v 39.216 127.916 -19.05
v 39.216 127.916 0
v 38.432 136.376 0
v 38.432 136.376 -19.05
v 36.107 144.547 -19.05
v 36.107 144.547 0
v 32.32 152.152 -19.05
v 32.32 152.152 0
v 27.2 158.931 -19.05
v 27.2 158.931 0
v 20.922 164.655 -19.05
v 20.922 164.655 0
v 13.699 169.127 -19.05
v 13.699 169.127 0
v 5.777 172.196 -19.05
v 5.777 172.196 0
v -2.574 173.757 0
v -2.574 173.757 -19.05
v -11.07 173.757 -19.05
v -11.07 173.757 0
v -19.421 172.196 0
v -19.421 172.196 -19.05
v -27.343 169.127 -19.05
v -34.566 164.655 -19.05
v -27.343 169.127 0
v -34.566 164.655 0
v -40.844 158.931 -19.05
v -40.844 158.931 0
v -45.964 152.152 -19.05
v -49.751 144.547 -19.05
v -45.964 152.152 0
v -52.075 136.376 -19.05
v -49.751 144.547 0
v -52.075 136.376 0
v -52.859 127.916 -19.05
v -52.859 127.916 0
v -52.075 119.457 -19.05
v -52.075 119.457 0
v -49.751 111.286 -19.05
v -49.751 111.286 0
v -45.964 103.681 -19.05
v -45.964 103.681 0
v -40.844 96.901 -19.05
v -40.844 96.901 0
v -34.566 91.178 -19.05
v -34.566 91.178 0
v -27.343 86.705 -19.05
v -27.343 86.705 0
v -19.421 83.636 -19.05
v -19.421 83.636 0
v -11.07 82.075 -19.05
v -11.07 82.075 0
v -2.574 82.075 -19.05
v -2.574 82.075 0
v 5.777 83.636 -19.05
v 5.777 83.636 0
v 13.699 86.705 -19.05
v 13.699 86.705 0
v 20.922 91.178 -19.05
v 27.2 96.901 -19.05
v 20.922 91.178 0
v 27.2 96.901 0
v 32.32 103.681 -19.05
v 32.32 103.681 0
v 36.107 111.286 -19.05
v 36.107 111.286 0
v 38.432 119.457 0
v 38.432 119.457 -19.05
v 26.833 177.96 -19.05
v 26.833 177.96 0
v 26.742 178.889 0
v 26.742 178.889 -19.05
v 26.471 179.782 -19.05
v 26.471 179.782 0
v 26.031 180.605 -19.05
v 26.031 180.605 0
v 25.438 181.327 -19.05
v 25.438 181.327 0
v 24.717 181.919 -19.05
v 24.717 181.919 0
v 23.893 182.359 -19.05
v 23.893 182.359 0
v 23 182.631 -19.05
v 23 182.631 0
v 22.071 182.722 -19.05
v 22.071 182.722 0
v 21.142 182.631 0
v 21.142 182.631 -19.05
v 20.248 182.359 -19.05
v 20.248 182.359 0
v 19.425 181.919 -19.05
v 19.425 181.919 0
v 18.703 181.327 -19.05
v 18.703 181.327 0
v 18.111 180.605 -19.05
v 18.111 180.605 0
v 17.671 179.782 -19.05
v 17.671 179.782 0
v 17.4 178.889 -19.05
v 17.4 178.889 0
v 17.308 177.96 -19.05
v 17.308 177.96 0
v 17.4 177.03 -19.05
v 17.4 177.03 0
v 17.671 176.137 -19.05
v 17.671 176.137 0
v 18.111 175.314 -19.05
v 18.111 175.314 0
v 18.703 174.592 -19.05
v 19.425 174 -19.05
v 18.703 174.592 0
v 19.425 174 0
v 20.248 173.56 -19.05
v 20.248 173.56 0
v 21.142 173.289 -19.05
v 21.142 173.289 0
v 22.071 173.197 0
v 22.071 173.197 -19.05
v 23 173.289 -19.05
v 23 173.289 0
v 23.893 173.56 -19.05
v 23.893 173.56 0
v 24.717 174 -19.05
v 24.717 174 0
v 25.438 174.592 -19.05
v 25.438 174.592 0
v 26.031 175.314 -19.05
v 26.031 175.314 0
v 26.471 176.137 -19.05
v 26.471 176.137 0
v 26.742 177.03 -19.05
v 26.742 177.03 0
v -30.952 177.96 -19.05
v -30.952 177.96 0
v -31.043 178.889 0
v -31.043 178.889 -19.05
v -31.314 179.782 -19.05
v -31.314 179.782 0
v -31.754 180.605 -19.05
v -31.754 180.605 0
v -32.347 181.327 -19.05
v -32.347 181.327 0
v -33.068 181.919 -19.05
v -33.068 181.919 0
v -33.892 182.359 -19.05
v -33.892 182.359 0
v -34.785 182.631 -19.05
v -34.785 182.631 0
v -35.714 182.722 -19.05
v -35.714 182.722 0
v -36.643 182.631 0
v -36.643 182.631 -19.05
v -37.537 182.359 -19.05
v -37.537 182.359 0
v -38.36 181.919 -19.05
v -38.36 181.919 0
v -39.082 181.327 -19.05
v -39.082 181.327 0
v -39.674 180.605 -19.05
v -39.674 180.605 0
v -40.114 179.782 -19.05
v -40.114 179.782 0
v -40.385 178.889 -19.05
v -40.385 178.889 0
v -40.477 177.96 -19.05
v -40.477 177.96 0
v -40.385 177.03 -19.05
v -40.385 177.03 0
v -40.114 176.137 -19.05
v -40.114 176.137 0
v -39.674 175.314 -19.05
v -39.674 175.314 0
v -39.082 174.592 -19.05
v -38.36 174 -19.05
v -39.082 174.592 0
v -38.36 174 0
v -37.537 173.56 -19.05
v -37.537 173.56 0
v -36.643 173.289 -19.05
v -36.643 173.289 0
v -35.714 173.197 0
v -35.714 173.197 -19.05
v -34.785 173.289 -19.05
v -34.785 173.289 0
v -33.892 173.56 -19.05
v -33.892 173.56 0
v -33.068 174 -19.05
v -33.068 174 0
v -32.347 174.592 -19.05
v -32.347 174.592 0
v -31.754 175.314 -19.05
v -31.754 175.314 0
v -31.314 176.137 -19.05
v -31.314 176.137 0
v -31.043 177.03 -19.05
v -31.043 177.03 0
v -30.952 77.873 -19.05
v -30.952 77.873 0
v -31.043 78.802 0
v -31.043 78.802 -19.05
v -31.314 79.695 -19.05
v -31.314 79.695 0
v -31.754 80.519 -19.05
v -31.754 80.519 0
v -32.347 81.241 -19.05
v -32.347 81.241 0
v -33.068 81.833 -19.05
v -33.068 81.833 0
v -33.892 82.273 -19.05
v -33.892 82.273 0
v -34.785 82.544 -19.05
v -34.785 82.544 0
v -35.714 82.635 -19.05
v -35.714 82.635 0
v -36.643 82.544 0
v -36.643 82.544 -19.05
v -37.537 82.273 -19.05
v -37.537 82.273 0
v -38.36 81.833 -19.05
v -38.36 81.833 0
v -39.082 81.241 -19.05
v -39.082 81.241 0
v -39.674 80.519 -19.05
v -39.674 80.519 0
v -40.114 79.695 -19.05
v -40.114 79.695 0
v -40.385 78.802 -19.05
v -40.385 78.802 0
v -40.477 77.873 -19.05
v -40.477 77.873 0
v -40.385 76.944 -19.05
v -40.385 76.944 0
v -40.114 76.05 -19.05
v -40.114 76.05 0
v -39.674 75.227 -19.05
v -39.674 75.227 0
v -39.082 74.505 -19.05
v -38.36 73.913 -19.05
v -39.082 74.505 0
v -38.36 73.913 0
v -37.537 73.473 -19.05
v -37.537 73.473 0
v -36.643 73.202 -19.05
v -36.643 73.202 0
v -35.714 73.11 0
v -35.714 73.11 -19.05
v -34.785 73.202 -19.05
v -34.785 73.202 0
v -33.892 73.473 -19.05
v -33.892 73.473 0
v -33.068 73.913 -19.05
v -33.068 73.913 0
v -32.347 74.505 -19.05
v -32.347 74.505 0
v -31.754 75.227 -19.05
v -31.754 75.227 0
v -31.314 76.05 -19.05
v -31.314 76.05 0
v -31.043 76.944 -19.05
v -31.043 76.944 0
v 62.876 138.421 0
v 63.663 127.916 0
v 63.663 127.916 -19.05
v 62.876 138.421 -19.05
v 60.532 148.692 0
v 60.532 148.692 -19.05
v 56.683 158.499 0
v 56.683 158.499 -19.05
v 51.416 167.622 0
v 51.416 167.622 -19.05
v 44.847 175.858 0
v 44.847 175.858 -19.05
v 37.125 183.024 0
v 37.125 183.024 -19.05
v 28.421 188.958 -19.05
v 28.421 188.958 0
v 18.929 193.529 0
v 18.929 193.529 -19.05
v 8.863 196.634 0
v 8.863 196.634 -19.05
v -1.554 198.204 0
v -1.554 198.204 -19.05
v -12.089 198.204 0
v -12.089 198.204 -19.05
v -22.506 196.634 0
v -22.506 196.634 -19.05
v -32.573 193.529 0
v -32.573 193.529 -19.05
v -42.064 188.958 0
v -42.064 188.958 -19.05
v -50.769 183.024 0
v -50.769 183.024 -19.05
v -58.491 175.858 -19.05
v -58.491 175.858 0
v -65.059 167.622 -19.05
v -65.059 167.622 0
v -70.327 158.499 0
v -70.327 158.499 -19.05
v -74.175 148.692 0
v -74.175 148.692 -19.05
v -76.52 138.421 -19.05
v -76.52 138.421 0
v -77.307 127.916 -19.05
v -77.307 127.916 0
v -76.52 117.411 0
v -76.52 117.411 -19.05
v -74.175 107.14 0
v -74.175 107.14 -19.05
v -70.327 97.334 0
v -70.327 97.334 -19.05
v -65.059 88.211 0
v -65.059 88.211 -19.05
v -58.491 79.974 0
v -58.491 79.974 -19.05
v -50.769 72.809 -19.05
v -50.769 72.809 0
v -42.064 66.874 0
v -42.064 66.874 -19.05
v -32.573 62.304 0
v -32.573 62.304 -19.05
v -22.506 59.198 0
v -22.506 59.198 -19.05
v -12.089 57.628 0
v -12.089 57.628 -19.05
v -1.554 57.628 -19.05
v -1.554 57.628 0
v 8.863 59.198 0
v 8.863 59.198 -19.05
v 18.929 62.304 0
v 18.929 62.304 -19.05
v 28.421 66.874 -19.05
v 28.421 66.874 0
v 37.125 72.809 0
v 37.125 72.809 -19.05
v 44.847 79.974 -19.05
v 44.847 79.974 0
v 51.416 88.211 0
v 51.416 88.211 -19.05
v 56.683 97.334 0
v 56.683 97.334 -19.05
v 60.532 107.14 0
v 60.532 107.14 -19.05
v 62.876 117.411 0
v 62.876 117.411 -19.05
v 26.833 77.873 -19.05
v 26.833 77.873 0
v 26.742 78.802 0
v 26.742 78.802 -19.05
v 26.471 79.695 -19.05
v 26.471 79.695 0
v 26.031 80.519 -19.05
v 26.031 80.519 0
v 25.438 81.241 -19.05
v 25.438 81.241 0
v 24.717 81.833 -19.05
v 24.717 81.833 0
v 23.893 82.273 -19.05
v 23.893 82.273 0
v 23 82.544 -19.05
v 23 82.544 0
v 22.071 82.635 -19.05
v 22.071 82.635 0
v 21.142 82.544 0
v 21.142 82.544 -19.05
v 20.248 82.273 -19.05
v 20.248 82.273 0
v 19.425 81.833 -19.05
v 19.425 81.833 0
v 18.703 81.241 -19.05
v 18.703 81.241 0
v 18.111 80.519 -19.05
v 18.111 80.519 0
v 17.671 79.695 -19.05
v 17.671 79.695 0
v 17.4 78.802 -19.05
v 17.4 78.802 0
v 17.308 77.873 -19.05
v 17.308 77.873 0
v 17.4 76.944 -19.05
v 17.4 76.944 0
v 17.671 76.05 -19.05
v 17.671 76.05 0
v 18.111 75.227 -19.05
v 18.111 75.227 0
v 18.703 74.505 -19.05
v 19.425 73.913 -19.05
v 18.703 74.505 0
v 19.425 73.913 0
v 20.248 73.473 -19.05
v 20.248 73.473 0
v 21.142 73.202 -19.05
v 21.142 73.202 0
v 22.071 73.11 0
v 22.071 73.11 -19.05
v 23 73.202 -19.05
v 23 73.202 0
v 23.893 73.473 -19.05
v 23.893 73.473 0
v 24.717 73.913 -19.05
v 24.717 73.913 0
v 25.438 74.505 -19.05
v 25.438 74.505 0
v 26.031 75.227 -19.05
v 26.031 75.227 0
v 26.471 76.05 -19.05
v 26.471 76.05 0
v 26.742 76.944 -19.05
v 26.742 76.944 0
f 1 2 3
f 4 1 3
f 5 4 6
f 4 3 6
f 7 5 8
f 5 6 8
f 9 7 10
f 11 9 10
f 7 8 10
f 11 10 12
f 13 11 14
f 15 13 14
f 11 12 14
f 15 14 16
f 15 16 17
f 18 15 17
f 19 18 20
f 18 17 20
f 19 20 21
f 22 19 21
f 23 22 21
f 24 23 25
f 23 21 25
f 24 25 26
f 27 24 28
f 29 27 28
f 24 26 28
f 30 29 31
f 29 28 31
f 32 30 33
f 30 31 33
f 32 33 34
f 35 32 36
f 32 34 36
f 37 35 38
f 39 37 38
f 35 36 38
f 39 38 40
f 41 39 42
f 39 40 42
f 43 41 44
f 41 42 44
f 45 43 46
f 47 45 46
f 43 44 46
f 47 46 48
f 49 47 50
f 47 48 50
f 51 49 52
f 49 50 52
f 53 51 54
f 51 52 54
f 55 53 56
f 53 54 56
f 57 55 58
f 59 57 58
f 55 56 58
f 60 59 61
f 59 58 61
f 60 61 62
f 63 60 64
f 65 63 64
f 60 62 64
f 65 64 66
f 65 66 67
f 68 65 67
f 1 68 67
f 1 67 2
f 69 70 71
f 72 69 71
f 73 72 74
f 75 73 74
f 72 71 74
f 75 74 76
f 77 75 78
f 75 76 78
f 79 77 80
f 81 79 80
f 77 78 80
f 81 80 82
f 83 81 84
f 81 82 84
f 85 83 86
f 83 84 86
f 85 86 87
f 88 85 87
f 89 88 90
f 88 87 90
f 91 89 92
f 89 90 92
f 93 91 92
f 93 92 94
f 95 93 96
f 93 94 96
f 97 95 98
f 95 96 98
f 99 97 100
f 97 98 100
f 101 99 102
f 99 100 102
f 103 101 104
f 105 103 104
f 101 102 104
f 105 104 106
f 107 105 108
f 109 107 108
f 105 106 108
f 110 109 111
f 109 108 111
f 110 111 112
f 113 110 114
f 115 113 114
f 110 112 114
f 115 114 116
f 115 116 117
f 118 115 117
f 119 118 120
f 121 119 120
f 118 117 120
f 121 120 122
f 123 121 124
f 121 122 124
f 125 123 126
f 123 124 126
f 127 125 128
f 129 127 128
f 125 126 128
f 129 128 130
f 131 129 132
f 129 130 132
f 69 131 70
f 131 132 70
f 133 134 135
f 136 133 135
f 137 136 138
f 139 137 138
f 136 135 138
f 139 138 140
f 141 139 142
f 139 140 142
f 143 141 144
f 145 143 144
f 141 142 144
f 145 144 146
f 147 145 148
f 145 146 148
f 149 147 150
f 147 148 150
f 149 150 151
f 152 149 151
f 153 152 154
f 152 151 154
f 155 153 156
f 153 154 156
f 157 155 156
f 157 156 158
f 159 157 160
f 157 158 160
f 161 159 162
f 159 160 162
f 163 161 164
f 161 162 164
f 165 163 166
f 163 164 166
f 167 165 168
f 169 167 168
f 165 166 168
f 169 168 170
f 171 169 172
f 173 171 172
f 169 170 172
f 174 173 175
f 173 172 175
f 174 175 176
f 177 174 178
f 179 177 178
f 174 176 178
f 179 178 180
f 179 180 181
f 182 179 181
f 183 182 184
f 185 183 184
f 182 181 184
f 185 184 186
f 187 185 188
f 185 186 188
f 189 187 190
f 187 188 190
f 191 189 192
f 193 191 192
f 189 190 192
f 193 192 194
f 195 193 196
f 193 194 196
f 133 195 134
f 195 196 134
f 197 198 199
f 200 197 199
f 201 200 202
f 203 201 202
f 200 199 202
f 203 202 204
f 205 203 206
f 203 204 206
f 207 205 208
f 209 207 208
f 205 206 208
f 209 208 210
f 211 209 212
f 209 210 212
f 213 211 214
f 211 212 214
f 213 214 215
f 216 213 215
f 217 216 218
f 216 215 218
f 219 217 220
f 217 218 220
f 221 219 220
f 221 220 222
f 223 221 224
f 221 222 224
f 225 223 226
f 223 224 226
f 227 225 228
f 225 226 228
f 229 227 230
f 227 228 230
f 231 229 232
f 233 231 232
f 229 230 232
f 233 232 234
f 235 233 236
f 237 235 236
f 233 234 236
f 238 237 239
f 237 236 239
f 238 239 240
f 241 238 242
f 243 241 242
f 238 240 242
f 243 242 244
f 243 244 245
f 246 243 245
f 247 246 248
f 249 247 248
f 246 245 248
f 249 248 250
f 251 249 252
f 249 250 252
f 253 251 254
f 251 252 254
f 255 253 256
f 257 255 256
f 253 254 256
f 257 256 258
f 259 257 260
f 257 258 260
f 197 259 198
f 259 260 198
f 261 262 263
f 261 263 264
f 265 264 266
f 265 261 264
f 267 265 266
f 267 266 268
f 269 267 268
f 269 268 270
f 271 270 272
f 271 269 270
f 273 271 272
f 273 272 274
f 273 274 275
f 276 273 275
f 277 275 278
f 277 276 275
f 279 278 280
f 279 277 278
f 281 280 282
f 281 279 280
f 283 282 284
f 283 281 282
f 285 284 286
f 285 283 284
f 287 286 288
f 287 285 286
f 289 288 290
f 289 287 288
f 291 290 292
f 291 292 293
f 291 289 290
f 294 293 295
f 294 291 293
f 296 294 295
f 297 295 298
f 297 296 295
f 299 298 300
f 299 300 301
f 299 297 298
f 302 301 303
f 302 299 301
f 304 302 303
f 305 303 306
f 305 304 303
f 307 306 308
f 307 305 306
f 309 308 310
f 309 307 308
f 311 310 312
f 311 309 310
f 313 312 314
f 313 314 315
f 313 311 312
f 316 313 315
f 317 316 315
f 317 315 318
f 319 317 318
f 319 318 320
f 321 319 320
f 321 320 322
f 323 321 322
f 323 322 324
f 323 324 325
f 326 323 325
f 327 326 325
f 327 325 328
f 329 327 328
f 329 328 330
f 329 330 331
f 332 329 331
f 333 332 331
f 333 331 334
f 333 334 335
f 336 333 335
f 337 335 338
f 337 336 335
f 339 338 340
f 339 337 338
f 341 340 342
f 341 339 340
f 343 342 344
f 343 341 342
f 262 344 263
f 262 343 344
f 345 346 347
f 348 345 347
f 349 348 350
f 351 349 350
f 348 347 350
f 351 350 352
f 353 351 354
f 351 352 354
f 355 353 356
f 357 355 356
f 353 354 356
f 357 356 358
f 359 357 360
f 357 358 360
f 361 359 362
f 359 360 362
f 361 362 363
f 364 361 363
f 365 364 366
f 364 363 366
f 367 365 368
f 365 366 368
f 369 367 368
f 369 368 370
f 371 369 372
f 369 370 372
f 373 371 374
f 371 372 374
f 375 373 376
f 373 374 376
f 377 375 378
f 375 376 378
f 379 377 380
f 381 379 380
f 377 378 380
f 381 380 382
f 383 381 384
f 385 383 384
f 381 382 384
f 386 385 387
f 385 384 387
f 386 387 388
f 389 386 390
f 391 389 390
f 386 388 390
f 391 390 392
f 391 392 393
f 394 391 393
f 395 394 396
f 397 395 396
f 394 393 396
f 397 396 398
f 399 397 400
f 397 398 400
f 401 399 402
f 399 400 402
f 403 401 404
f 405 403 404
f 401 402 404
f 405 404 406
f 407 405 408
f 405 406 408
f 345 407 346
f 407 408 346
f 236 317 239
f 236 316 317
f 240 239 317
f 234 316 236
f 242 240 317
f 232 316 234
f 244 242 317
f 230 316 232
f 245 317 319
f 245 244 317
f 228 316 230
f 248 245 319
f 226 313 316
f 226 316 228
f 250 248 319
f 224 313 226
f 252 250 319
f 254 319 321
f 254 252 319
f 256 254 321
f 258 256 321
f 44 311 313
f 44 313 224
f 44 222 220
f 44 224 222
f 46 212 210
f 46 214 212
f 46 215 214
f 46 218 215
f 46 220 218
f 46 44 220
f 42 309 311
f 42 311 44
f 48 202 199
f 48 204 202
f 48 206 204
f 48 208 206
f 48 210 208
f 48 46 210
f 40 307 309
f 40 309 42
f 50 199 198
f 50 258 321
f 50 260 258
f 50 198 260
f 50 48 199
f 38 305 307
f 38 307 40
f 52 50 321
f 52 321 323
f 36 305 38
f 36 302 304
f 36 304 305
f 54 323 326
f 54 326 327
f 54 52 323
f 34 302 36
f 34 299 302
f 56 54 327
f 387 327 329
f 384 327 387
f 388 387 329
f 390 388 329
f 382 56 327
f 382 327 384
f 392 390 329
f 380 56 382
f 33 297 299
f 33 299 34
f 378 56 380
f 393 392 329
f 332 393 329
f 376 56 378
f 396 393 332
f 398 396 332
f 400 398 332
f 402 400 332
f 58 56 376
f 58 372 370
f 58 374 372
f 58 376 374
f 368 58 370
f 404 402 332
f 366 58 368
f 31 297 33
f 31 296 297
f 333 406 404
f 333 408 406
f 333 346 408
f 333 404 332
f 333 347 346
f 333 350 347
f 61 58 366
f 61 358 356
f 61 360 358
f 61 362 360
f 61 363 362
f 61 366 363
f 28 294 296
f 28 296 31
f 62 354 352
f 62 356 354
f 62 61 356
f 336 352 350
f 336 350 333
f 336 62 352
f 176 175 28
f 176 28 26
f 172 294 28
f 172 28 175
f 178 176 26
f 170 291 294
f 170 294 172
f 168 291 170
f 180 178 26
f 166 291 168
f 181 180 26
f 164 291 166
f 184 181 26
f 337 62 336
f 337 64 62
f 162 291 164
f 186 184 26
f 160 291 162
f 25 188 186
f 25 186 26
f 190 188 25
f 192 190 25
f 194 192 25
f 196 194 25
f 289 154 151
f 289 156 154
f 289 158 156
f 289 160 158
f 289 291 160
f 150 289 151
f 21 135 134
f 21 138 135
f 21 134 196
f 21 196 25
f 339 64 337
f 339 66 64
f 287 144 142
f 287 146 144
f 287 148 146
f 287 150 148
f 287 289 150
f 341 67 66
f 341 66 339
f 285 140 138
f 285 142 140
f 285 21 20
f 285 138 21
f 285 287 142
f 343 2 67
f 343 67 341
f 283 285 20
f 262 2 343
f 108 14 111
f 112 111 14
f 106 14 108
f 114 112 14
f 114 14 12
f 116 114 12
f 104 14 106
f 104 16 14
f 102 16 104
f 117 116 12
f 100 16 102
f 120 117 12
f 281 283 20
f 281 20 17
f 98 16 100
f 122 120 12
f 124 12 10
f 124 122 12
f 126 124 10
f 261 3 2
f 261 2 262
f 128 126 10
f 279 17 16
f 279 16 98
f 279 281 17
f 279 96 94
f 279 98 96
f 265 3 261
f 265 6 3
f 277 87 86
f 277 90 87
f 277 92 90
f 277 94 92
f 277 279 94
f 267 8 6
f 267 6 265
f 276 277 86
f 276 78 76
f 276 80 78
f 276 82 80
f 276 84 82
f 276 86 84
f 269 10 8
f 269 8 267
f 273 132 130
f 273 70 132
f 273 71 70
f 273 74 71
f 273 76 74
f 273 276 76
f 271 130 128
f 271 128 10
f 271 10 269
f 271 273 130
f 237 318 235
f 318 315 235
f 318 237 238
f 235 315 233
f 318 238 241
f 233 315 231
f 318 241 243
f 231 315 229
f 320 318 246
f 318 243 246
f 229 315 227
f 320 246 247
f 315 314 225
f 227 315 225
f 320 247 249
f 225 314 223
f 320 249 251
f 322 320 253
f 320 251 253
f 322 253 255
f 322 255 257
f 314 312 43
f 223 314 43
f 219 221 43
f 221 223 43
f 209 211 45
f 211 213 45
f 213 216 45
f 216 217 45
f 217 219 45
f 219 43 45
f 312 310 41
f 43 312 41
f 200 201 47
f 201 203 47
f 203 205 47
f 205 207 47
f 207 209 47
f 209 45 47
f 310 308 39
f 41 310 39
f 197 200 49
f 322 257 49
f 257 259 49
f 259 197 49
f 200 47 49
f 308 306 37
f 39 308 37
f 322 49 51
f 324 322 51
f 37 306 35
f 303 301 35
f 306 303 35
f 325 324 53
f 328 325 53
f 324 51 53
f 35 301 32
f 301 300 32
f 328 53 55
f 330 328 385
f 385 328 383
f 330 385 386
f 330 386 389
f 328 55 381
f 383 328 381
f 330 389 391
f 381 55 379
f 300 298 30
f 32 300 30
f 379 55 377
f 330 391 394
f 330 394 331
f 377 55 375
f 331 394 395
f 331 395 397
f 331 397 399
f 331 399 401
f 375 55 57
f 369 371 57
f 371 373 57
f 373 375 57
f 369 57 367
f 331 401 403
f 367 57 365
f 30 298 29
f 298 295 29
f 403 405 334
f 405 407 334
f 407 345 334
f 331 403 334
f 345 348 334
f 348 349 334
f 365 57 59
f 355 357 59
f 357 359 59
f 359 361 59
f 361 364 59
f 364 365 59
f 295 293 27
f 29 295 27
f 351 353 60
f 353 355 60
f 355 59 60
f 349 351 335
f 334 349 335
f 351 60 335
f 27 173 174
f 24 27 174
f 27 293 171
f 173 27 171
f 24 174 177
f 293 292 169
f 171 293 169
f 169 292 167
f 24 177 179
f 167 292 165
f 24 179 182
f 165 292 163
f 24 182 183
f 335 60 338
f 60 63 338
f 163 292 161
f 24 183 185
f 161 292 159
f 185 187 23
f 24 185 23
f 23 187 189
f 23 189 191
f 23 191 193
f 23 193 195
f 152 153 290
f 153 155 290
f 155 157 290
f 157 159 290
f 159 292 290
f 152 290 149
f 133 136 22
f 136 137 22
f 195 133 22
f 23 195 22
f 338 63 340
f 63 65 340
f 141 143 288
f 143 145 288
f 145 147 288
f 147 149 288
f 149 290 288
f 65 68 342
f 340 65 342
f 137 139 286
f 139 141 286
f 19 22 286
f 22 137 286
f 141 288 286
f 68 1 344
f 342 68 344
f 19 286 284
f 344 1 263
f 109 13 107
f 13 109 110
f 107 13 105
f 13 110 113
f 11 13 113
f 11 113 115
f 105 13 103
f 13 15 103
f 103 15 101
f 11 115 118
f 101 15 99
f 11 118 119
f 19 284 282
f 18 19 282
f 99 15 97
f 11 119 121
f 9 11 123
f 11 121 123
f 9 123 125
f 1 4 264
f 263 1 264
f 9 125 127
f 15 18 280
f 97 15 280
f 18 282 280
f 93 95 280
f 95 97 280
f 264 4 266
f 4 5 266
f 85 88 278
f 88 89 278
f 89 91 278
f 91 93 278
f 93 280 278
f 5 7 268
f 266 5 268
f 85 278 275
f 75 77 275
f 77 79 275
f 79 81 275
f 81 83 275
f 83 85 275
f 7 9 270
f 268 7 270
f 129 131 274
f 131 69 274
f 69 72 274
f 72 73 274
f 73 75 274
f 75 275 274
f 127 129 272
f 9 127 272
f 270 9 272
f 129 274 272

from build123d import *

# Parameters (mm, degrees)
F0_R     = 70.485
F0_R_2   = 4.7625
F0_R_3   = 46.0375
F1_DEPTH = 19.05


with BuildPart() as f1:
    # F0 (on Top) → F1 (new body)
    with BuildSketch(Plane.XY):
        with Locations((-6.82183, 127.916229)):
            Circle(F0_R)
        with Locations((-35.71433, 77.872946)):
            Circle(F0_R_2, mode=Mode.SUBTRACT)
        with Locations((-35.71433, 177.959512)):
            Circle(F0_R_2, mode=Mode.SUBTRACT)
        with Locations((22.07067, 77.872946)):
            Circle(F0_R_2, mode=Mode.SUBTRACT)
        with Locations((-6.82183, 127.916229)):
            Circle(F0_R_3, mode=Mode.SUBTRACT)
        with Locations((22.07067, 177.959512)):
            Circle(F0_R_2, mode=Mode.SUBTRACT)
    extrude(amount=-F1_DEPTH)


solid = f1.part
